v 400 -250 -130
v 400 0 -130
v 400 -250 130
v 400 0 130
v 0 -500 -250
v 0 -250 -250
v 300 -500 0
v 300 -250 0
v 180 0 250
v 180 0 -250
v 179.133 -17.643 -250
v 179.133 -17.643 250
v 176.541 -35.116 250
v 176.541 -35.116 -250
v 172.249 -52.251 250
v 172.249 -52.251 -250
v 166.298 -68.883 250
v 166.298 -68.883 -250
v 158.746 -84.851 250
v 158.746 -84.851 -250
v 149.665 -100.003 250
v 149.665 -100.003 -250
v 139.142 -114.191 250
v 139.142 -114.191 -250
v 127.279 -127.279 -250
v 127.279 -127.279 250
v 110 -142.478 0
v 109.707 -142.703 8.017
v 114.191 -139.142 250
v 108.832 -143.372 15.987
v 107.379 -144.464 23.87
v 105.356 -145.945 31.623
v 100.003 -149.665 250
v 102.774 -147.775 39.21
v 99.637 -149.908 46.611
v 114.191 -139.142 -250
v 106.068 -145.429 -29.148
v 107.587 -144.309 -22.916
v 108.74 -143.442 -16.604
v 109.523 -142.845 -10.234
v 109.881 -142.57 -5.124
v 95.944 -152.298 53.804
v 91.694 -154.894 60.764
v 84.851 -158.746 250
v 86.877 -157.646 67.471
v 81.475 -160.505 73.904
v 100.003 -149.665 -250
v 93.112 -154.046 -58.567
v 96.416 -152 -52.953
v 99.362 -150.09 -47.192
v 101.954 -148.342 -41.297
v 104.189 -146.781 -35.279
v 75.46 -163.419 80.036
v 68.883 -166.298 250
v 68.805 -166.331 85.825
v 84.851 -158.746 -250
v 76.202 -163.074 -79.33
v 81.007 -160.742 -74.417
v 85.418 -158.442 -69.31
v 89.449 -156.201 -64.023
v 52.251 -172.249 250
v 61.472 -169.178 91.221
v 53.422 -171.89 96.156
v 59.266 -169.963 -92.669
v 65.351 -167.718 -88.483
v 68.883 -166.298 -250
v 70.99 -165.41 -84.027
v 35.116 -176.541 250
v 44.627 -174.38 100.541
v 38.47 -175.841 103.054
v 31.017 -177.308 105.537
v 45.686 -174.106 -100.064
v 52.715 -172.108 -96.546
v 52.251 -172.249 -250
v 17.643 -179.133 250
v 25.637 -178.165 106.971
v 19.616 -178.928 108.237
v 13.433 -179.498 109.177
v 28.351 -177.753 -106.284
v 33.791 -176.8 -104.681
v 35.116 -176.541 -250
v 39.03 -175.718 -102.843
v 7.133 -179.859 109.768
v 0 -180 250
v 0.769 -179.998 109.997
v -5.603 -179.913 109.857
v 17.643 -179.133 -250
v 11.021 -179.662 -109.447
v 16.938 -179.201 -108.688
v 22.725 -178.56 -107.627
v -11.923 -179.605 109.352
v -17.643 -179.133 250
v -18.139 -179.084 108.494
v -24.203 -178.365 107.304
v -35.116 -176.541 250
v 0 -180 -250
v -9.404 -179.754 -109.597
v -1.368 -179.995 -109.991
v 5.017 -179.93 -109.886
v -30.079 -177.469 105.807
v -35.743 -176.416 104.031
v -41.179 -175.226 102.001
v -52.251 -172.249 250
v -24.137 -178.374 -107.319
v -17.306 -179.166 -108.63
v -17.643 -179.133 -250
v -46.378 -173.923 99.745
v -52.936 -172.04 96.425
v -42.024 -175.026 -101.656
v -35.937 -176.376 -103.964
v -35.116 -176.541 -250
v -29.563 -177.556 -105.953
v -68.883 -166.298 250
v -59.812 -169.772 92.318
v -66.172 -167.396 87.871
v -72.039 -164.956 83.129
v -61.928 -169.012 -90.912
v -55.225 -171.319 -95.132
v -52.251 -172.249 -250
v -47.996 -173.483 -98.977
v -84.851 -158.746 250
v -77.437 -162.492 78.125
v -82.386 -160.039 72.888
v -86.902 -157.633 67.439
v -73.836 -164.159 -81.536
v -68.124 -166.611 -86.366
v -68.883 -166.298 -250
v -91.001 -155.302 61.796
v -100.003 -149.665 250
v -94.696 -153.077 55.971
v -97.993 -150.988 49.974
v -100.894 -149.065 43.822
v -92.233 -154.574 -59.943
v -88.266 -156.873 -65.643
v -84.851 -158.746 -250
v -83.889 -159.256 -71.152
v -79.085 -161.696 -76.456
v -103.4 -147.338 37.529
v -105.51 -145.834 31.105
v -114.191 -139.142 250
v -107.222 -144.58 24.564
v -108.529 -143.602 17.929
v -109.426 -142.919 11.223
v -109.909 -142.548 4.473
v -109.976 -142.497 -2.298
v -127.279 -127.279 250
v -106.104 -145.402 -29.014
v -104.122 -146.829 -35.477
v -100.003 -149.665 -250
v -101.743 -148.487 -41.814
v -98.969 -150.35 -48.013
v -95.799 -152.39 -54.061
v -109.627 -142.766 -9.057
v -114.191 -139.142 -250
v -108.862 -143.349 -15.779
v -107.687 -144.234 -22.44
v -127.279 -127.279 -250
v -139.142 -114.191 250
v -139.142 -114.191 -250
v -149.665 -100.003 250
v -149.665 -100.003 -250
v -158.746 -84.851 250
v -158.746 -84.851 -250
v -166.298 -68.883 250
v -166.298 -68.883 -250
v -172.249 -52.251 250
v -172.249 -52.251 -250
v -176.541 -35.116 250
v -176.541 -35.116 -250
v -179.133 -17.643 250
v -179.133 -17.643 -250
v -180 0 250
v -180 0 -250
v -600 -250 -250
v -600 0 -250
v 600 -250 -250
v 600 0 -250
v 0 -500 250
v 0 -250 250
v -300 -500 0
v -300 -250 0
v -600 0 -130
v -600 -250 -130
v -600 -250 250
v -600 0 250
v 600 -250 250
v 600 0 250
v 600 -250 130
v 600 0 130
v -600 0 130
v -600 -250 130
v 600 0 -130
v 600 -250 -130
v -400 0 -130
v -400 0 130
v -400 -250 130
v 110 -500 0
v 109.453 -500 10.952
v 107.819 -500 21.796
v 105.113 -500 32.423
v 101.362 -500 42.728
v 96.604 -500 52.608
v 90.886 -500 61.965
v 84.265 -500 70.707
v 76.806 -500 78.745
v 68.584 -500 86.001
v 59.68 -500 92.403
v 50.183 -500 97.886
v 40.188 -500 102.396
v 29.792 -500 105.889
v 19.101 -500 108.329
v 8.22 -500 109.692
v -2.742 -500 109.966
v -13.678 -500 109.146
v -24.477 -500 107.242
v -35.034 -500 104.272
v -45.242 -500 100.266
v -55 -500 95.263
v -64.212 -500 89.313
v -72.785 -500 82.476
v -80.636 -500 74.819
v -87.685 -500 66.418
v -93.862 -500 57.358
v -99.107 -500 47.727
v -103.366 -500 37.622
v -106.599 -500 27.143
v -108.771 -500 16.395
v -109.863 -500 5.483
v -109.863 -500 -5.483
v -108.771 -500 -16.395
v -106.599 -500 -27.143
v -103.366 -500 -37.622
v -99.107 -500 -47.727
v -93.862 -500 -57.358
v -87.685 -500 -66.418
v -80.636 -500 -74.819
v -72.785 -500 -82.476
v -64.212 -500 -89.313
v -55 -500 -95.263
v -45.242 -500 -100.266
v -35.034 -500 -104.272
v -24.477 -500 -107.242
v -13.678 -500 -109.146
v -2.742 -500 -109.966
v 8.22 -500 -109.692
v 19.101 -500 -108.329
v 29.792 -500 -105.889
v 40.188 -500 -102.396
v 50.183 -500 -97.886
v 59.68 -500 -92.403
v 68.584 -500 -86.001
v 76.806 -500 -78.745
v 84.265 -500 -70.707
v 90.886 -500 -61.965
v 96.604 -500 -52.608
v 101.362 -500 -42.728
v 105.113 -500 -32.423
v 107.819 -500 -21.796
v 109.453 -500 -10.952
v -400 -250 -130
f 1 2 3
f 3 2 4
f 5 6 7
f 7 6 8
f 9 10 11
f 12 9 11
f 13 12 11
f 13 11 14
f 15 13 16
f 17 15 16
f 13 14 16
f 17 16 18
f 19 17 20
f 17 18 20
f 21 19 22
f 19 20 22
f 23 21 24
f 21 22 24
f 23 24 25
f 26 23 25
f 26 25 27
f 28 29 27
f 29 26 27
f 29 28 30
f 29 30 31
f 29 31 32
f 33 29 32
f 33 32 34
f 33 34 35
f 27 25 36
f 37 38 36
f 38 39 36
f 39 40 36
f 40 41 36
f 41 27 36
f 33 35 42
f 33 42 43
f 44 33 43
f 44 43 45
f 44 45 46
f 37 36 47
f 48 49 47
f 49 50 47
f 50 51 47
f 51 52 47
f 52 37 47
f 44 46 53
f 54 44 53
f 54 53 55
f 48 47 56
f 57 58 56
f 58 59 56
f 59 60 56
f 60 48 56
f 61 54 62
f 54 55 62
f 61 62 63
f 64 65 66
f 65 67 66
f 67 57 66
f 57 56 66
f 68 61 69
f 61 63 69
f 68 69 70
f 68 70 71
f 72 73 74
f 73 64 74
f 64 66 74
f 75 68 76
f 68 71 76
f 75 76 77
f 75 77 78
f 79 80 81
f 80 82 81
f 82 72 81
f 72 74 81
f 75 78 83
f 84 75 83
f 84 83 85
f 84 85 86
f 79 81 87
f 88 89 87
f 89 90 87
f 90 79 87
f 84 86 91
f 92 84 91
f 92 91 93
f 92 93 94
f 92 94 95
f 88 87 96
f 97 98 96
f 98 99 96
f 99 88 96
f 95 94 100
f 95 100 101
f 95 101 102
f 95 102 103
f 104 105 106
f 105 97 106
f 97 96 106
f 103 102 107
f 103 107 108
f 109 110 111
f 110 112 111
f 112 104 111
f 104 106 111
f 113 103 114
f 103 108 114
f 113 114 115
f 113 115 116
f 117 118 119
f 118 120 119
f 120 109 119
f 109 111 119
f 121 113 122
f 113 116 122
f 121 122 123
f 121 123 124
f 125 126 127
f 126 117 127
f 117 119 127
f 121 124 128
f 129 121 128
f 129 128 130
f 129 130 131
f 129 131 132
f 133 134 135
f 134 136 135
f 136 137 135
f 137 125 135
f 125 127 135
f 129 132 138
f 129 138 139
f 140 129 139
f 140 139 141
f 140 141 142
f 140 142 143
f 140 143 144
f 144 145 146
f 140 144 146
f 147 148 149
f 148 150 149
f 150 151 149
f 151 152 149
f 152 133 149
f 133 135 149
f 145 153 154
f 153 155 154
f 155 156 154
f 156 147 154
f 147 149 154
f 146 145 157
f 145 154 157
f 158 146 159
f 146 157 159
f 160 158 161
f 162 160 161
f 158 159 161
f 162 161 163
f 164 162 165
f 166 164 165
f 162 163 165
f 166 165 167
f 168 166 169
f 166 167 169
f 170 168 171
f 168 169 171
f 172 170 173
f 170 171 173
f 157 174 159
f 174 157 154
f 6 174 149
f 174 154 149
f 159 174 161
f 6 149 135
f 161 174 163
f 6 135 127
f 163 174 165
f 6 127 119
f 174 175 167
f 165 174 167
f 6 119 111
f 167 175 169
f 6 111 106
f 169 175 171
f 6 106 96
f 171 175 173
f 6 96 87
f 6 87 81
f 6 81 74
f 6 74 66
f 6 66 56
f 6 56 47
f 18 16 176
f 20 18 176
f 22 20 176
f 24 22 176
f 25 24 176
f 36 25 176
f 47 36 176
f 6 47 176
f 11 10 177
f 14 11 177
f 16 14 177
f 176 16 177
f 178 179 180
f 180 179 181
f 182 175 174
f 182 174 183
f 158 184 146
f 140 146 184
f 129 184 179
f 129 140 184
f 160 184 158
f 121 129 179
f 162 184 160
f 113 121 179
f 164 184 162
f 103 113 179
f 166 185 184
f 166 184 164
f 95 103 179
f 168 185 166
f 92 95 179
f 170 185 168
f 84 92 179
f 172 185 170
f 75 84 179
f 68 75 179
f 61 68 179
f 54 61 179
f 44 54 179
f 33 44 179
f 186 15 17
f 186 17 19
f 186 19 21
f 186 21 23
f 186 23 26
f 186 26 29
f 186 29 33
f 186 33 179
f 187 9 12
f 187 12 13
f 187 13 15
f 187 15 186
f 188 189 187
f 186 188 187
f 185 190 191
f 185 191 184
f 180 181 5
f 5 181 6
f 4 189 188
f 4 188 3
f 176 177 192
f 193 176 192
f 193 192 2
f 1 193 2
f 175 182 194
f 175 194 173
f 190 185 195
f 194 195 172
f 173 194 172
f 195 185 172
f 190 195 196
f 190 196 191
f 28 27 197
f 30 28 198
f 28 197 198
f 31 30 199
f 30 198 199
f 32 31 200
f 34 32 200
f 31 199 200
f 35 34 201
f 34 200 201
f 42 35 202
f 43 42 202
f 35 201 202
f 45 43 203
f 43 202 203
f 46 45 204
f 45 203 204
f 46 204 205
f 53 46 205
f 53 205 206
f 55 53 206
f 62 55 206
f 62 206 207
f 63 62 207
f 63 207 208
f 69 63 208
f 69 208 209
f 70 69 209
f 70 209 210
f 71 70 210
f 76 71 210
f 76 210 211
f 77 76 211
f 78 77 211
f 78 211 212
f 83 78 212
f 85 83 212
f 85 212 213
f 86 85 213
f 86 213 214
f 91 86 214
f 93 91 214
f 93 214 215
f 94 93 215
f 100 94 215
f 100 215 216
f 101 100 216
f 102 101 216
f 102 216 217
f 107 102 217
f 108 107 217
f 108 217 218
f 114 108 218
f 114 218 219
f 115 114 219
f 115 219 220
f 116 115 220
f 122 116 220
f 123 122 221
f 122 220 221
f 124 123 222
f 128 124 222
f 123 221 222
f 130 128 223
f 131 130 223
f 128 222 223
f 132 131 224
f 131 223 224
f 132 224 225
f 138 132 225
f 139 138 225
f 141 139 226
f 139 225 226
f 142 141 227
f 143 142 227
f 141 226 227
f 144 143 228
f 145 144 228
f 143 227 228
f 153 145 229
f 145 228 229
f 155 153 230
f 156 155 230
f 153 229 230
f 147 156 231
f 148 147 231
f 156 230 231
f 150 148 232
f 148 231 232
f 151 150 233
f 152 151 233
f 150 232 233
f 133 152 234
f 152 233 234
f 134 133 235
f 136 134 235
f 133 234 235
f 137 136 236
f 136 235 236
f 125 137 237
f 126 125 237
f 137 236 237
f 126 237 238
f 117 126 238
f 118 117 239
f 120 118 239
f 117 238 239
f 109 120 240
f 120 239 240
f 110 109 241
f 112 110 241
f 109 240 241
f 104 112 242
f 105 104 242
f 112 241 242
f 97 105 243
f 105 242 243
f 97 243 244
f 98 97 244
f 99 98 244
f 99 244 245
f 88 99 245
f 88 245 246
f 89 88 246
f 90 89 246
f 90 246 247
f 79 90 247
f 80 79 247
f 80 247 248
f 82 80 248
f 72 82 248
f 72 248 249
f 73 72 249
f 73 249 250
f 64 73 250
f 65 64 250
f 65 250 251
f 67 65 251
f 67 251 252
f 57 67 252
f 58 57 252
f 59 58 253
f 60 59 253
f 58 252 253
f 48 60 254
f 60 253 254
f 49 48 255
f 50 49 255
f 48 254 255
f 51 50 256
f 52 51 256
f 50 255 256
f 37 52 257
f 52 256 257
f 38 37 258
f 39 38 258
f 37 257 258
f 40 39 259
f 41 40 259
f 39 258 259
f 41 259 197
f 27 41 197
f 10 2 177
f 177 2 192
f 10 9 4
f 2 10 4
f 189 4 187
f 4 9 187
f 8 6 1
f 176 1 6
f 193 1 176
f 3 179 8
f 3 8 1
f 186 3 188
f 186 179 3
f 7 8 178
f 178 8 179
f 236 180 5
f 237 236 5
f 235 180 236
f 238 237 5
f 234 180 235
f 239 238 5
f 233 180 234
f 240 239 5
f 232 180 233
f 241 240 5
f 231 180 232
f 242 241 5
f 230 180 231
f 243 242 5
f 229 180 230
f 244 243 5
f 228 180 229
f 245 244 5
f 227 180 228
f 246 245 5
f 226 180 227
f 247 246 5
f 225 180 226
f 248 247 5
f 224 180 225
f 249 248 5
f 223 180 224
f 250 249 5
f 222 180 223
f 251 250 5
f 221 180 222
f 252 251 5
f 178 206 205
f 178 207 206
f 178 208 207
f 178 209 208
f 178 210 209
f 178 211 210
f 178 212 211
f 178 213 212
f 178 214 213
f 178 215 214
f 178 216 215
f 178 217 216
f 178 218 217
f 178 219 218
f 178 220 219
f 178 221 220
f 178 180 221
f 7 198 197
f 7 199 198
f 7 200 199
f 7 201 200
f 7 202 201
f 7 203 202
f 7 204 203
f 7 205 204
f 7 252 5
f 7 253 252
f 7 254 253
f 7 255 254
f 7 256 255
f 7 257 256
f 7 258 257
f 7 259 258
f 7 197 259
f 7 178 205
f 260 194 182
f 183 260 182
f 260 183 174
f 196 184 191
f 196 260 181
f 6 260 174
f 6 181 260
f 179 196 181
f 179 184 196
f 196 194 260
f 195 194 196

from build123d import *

# Parameters (mm, degrees)
F0_W     = 1200
F0_H     = 500
F1_DEPTH = 250
F2_W     = 400
F2_H     = 260
F3_DEPTH = 250.001
F5_DEPTH = 250
F6_R     = 110
F7_DEPTH = 500.001
F8_R     = 180
F9_DEPTH = 500.001


with BuildPart() as f1:
    # F0 (on Front) → F1 (new body)
    with BuildSketch(Plane.XZ):
        Rectangle(F0_W, F0_H)
    extrude(amount=F1_DEPTH)

    # F2 (on face) → F3 (cut, through all)
    with BuildSketch(Plane(origin=(0, 0, 0), x_dir=(-1, 0, 0), z_dir=(0, 1, 0))):
        with Locations((-600, 0)):
            Rectangle(F2_W, F2_H)
        with Locations((600, 0)):
            Rectangle(F2_W, F2_H)
    extrude(amount=-F3_DEPTH, mode=Mode.SUBTRACT)

    # F4 (on face) → F5 (join)
    with BuildSketch(Plane.XZ.offset(250)):
        Polygon((0, 250), (-300, 0), (0, -250), (300, 0), align=None)
    extrude(amount=F5_DEPTH)

    # F6 (on face) → F7 (cut, through all)
    with BuildSketch(Plane.XZ.offset(500)):
        Circle(F6_R)
    extrude(amount=-F7_DEPTH, mode=Mode.SUBTRACT)

    # F8 (on face) → F9 (cut, through all)
    with BuildSketch(Plane(origin=(0, 0, -250), x_dir=(1, 0, 0), z_dir=(0, 0, -1))):
        Circle(F8_R)
    extrude(amount=-F9_DEPTH, mode=Mode.SUBTRACT)


solid = f1.part
